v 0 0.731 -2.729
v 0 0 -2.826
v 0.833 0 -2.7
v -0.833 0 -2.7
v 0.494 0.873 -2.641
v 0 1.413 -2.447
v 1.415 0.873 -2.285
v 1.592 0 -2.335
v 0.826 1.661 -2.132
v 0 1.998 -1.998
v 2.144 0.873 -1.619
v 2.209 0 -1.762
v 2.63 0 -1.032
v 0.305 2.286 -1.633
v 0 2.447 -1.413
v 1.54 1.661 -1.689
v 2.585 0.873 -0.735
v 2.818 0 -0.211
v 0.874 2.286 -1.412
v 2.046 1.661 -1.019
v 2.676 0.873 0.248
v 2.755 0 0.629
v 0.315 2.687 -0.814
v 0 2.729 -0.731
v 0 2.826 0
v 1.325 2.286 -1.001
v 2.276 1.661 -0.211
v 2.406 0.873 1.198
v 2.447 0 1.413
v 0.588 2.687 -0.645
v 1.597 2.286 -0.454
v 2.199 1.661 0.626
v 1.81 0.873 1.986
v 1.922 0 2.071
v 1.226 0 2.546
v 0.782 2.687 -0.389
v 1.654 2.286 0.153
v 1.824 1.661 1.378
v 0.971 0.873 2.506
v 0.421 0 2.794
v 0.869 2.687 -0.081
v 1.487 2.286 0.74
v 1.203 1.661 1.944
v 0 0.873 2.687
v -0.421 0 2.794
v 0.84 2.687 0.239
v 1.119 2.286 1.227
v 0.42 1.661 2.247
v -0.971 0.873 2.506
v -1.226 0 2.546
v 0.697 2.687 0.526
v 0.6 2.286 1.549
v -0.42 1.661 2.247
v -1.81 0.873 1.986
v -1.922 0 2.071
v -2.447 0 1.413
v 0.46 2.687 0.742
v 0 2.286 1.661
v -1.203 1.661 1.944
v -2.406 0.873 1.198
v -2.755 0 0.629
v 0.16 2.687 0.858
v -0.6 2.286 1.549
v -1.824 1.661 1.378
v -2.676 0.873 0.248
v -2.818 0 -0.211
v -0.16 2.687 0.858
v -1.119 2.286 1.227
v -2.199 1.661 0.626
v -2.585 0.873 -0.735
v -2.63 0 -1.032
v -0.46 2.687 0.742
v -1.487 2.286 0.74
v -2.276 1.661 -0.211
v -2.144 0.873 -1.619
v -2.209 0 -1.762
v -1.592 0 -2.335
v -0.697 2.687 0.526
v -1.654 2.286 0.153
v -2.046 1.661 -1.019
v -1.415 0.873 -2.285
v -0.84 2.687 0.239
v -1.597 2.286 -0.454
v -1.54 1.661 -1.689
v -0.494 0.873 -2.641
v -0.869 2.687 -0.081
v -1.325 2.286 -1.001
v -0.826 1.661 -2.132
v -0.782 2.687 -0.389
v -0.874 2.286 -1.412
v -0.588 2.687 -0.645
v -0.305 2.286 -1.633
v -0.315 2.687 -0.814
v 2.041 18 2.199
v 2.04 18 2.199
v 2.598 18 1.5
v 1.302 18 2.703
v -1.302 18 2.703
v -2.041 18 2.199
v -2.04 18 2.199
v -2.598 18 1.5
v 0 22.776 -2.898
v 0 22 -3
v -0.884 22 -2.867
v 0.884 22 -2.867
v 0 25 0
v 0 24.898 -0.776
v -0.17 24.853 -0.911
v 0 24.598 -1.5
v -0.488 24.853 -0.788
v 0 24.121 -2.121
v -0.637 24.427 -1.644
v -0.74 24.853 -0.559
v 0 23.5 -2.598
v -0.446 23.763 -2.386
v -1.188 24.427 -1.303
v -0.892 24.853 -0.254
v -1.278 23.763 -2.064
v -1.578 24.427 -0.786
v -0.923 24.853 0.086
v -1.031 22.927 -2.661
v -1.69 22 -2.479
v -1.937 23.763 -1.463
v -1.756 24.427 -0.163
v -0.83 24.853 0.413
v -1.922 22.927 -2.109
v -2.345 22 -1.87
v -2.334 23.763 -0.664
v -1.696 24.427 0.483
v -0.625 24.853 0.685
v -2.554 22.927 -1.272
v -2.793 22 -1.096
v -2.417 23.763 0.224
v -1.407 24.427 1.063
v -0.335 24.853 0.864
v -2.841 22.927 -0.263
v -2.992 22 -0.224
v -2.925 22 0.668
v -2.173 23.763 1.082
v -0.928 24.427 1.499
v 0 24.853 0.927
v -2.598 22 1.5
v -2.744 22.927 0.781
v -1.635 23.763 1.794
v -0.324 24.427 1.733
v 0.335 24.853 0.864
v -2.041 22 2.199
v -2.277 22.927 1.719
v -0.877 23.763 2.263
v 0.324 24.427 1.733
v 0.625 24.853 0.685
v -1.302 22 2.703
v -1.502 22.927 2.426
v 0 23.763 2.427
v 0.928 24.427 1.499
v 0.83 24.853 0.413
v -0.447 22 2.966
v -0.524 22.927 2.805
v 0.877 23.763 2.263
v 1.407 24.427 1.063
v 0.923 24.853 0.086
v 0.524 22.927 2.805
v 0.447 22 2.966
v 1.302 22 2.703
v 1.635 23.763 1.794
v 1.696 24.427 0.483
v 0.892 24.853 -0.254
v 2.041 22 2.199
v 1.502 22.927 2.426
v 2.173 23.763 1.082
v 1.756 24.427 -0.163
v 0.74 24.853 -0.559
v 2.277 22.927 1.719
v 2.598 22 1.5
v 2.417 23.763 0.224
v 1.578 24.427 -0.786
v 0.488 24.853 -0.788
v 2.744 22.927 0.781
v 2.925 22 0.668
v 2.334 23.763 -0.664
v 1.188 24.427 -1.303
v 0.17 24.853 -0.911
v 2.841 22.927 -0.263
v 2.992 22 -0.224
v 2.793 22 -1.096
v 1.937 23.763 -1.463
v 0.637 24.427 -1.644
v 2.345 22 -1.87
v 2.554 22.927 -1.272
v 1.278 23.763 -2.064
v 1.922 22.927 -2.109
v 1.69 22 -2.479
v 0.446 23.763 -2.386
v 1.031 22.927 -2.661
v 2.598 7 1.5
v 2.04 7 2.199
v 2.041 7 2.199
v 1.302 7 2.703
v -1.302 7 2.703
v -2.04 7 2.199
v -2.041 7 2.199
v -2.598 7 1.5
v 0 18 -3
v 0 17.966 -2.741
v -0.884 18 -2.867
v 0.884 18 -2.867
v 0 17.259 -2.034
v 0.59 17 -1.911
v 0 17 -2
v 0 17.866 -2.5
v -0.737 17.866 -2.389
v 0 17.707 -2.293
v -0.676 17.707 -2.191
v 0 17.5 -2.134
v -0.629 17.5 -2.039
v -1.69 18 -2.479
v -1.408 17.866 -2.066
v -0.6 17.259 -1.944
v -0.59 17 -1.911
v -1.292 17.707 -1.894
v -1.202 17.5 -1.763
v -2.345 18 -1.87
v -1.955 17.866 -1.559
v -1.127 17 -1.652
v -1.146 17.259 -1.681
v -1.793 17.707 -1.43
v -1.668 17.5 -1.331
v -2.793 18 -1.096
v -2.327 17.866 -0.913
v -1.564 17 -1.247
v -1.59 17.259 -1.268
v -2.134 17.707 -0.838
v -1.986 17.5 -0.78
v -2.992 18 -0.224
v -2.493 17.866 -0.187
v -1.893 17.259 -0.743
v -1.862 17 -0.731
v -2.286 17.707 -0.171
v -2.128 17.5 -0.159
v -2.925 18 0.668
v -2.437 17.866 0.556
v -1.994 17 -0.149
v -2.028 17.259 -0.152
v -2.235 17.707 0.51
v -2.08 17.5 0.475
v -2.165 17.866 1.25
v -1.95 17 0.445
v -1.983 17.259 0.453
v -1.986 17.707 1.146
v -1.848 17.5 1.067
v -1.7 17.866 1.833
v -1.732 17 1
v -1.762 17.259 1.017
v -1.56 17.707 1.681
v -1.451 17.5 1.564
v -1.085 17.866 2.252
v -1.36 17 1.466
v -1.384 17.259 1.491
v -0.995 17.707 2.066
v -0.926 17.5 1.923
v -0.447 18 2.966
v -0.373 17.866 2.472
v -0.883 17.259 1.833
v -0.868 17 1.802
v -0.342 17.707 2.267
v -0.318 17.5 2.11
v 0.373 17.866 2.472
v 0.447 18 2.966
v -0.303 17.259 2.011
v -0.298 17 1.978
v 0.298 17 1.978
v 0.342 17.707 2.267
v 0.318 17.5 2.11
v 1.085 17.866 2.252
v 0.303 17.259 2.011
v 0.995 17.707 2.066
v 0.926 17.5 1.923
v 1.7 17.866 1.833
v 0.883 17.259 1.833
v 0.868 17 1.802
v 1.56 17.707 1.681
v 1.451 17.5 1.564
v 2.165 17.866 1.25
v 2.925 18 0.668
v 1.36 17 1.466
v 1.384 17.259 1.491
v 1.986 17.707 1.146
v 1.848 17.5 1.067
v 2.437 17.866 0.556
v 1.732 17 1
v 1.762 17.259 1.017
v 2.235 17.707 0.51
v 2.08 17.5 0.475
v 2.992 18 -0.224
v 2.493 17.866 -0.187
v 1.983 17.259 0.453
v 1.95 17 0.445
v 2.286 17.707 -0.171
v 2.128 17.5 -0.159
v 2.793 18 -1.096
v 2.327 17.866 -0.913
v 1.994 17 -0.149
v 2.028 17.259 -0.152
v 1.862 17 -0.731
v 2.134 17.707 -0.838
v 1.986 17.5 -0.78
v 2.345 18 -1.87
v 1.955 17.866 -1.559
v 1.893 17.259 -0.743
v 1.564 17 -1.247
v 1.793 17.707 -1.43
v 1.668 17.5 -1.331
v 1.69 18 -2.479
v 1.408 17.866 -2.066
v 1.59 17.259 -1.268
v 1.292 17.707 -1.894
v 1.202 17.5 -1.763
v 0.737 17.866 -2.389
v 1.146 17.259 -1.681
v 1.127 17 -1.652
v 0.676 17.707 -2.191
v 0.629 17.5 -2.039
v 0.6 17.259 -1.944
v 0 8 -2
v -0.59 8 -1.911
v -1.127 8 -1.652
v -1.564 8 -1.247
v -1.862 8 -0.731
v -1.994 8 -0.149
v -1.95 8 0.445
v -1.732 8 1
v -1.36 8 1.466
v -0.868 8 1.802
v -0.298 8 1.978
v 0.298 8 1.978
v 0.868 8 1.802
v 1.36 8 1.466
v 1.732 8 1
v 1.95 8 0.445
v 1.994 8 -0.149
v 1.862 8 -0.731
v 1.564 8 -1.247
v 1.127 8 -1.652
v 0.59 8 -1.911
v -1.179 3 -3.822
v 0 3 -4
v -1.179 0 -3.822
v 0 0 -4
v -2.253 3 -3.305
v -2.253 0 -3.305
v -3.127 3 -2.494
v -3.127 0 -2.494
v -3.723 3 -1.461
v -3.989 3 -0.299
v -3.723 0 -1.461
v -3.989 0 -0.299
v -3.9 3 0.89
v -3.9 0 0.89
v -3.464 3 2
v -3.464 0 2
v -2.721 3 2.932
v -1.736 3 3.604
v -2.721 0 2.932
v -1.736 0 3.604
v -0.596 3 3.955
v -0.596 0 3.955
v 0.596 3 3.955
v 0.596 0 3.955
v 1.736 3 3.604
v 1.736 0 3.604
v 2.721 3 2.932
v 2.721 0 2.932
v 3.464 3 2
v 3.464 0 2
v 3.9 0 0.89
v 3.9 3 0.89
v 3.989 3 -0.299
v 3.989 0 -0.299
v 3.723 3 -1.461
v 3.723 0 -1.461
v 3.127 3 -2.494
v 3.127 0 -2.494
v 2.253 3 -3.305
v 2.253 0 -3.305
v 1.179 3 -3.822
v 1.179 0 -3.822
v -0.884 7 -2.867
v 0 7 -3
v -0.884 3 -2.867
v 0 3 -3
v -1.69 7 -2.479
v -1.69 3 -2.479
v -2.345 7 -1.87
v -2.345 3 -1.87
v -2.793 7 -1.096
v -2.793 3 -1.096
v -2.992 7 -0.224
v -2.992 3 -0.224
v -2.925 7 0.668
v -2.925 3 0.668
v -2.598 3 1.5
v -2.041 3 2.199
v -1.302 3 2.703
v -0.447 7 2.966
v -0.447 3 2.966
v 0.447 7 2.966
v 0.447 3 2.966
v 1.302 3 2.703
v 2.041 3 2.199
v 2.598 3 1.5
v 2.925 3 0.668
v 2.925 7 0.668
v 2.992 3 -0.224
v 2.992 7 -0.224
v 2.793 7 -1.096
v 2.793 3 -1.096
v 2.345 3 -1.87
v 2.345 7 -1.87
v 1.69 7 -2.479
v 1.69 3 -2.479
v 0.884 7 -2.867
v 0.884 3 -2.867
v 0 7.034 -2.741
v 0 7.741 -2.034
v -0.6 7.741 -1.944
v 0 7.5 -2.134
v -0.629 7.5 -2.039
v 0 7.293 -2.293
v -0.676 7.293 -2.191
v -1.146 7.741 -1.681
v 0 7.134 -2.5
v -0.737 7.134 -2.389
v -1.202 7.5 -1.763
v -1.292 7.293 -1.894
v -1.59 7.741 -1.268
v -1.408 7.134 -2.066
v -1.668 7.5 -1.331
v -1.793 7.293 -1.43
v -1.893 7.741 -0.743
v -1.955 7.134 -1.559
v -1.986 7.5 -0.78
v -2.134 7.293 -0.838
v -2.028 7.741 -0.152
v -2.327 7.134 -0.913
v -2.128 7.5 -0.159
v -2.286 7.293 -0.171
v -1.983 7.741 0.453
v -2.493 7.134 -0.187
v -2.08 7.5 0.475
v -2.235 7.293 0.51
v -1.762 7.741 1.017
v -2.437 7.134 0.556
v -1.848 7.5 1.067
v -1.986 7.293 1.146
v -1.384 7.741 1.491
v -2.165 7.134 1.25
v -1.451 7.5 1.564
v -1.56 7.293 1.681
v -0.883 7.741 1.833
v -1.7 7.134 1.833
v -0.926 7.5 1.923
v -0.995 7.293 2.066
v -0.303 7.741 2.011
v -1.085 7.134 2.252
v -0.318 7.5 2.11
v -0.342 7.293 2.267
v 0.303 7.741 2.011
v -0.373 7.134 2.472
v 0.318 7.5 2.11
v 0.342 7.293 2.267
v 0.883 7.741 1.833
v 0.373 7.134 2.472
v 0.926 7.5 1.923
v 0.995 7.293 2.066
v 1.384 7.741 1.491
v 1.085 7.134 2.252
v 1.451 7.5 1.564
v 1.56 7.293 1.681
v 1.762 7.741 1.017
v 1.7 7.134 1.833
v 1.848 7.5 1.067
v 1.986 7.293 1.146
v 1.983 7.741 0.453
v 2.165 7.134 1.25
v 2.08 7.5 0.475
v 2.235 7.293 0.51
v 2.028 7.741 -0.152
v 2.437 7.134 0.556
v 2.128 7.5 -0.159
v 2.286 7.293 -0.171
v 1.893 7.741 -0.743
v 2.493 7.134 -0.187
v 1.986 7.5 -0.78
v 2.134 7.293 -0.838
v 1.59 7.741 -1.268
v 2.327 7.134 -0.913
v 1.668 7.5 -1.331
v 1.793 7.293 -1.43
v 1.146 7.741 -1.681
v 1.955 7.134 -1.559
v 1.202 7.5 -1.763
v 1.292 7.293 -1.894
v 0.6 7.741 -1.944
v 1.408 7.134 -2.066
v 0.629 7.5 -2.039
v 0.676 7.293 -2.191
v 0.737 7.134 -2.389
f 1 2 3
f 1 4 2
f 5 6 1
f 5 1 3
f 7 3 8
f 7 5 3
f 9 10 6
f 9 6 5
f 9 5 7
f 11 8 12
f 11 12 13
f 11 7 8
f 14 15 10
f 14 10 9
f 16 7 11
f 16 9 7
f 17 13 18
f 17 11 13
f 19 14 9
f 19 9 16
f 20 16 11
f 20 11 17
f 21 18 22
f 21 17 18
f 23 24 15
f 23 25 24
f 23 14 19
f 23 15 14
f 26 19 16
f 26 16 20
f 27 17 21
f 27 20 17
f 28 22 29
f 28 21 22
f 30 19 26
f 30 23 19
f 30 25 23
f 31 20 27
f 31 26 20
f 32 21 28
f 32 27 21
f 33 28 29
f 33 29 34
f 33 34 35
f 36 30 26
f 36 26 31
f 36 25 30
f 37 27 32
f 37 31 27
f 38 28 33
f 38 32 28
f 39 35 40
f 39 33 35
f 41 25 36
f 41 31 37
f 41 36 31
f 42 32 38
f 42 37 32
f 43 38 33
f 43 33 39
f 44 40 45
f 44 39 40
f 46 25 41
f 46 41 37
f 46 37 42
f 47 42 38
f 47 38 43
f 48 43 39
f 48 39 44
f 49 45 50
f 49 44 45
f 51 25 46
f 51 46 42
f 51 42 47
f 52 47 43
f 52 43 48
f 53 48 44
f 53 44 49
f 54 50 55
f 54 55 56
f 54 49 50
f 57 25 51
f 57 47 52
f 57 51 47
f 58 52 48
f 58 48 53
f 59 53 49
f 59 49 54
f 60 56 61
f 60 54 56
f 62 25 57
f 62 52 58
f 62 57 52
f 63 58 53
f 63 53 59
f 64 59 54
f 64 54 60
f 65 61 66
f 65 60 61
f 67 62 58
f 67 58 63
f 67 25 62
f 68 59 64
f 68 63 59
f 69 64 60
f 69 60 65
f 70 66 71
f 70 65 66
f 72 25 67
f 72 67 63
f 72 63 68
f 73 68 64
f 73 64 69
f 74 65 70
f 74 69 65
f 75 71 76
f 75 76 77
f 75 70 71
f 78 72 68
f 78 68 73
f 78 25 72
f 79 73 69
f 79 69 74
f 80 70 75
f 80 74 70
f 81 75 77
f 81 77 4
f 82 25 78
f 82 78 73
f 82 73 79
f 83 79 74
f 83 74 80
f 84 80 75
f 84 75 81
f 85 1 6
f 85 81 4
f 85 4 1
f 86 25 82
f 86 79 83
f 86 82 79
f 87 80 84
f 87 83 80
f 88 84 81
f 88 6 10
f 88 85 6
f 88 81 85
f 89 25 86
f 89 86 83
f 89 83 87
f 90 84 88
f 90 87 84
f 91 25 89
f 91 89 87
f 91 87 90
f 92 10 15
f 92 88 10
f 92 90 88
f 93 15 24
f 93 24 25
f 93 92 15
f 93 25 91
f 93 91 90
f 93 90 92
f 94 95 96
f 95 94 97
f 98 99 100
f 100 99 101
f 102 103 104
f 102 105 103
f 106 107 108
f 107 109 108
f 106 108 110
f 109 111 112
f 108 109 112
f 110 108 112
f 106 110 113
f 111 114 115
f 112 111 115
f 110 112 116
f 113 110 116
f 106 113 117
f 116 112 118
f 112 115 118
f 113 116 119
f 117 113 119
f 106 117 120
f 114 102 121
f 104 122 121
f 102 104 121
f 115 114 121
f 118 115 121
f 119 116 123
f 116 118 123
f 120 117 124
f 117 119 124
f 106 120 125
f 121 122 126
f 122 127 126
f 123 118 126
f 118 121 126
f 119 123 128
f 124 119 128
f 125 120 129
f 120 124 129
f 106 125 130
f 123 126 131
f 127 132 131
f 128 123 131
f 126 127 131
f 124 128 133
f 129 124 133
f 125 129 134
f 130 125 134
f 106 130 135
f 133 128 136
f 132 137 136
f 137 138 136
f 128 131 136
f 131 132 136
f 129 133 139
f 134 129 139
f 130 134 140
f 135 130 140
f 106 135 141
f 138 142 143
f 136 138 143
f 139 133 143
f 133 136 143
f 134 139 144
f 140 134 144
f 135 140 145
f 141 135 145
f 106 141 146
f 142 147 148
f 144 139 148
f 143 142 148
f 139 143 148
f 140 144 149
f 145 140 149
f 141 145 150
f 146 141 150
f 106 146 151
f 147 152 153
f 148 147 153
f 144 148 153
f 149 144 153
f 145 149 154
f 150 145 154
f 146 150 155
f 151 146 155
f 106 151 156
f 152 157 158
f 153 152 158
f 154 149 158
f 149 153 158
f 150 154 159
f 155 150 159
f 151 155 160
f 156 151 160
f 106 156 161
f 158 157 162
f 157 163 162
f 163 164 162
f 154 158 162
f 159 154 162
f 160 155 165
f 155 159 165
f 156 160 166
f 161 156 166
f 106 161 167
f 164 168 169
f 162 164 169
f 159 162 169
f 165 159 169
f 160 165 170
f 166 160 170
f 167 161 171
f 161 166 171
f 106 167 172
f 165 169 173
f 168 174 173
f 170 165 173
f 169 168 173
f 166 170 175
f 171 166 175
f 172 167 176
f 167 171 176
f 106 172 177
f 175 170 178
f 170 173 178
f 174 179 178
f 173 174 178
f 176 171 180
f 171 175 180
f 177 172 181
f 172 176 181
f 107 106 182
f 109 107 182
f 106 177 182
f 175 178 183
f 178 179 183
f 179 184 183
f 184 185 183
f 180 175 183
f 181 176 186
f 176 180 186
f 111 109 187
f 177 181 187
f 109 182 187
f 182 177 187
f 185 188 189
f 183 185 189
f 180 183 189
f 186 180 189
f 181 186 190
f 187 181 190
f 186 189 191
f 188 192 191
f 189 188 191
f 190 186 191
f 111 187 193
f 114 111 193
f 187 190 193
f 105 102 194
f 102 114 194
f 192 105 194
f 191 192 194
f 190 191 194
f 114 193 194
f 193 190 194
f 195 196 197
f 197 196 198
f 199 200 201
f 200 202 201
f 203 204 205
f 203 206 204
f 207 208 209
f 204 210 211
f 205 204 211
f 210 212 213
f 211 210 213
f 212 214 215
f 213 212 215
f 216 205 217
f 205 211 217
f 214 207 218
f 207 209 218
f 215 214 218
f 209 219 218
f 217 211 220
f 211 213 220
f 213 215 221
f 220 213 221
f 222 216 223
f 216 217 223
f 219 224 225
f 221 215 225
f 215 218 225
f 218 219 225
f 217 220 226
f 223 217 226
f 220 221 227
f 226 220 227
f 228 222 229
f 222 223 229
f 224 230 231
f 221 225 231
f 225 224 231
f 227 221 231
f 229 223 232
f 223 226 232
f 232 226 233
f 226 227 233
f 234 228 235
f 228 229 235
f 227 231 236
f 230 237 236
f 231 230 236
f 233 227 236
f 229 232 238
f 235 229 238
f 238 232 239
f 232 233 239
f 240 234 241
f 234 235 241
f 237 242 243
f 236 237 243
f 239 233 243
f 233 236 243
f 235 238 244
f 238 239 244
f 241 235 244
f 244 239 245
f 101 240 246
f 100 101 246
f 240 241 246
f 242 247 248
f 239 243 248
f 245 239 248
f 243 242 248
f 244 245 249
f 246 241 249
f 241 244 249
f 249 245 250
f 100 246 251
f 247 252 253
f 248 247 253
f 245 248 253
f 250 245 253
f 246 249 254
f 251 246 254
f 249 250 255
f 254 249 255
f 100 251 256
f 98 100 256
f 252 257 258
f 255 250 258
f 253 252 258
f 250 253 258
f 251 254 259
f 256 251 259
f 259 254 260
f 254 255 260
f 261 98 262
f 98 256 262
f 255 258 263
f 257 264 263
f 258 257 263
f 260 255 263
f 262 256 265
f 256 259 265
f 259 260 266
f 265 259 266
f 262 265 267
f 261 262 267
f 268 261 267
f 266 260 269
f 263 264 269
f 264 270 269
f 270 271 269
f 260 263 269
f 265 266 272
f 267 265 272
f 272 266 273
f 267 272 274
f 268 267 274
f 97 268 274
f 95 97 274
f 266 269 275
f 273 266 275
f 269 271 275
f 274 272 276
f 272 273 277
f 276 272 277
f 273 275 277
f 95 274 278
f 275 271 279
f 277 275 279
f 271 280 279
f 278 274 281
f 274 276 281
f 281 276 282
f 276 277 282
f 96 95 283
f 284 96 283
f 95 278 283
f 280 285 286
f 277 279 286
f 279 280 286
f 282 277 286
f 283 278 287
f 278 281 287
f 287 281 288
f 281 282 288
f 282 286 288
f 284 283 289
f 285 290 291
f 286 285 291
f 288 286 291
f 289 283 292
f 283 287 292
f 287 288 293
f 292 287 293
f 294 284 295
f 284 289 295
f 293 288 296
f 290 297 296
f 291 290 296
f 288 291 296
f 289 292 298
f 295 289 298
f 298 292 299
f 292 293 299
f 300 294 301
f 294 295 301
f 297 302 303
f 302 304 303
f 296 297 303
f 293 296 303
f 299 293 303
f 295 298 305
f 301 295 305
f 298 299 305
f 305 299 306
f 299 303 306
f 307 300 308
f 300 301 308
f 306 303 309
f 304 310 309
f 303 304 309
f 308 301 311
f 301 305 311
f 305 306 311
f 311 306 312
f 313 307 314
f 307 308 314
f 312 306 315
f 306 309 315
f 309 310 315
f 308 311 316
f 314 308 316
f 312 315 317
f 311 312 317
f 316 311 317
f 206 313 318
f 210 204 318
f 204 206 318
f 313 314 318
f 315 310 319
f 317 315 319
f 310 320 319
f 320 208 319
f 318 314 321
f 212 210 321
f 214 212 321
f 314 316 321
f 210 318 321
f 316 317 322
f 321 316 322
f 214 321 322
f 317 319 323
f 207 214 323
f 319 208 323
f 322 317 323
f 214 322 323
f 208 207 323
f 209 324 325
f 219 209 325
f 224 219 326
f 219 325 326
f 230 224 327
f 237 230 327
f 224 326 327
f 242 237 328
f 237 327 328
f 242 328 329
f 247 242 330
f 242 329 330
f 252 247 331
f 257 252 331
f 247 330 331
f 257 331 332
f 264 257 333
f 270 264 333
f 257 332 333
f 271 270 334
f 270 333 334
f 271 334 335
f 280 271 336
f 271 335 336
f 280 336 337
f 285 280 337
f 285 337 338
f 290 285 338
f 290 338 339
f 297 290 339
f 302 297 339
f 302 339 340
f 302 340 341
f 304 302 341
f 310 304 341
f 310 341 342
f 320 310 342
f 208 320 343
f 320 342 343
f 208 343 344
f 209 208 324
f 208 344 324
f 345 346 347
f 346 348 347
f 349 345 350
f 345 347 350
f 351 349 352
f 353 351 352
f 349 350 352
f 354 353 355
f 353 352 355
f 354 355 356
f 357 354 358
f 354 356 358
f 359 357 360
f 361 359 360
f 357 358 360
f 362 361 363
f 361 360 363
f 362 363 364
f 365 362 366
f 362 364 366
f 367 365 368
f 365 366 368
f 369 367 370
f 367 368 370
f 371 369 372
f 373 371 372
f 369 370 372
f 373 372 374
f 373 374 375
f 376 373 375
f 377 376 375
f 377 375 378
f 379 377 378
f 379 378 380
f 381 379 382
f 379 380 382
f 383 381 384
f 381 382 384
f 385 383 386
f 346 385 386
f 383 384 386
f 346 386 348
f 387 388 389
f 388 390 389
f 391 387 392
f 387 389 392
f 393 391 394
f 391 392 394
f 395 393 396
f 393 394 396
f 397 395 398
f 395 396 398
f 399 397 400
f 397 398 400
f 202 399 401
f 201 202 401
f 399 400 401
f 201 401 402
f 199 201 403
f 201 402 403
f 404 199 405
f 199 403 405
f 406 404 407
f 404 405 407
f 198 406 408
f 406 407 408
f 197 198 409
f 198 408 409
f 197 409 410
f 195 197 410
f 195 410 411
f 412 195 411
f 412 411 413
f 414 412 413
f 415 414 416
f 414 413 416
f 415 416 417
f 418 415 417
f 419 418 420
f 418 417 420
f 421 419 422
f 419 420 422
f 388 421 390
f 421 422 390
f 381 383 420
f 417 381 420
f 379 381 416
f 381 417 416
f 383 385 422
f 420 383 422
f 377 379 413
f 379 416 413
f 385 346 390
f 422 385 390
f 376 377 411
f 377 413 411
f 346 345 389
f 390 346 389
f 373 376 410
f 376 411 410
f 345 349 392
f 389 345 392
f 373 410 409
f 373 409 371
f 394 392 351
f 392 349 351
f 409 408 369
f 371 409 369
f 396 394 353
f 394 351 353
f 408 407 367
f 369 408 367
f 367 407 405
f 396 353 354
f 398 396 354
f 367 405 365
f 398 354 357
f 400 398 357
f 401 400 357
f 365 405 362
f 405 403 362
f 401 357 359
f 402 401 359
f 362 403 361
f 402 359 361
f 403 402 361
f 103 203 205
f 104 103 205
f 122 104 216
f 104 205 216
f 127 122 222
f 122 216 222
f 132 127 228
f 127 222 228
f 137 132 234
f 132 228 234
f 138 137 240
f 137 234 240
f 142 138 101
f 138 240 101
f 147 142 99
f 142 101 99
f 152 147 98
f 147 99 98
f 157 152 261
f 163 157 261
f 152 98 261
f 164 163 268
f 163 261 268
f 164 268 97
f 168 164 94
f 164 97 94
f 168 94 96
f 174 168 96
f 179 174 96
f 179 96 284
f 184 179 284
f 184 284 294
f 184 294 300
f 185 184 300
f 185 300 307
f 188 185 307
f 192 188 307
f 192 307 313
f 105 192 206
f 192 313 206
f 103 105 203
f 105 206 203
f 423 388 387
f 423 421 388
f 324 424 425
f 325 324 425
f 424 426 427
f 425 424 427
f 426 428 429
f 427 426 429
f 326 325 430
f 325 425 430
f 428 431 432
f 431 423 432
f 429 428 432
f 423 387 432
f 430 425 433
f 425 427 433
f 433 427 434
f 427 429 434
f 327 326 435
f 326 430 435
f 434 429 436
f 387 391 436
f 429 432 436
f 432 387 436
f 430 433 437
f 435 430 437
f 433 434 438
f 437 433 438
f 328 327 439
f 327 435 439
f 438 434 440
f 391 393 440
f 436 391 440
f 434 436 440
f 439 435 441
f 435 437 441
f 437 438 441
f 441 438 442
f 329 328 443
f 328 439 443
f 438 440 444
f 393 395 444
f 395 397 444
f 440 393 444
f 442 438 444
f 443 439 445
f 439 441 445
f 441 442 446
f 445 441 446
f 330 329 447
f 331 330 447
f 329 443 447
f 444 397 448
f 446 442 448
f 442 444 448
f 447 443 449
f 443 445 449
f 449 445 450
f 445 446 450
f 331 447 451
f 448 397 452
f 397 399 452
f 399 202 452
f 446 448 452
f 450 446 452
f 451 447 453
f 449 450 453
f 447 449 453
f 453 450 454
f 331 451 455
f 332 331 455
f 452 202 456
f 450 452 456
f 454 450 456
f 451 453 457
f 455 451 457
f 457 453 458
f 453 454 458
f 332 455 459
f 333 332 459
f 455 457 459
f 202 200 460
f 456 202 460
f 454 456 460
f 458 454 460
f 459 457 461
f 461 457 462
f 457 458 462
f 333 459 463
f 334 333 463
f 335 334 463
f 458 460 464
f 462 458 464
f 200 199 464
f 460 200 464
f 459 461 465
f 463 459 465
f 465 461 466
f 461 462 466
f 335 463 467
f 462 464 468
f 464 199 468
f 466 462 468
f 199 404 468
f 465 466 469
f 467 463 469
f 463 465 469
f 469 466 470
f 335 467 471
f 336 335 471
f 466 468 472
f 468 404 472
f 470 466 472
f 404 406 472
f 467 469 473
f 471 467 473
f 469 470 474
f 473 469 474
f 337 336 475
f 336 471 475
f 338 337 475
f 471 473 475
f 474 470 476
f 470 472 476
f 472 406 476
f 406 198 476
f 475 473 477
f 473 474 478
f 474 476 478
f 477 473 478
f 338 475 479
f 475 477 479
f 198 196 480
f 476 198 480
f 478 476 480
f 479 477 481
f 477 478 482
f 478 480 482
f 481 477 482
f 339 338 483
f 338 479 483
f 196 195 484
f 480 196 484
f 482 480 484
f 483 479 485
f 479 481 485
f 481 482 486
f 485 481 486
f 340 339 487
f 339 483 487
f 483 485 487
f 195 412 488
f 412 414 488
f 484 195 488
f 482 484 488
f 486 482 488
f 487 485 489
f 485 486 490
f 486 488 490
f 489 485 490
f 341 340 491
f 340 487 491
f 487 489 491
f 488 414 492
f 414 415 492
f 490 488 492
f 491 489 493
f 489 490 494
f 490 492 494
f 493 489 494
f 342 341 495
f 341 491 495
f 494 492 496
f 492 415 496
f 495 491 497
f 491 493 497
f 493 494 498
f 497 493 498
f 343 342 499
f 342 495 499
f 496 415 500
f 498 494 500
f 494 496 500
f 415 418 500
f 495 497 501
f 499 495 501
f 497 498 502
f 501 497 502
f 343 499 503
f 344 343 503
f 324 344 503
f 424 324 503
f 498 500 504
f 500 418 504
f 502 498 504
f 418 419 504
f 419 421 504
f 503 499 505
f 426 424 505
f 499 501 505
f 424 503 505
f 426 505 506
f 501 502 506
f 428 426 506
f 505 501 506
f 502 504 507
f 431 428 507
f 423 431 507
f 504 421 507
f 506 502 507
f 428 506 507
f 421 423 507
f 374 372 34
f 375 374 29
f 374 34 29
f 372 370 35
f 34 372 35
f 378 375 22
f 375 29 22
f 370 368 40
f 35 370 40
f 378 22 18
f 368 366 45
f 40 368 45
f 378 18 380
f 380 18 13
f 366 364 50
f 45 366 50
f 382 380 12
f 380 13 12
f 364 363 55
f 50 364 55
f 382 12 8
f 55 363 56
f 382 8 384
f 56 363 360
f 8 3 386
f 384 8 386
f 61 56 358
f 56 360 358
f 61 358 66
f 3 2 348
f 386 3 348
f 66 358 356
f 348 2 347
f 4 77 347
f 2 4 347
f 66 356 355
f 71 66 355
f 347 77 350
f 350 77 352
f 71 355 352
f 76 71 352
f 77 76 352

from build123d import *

# Parameters (mm, degrees)
FILLET1_R = 3
FILLET2_R = 1


with BuildPart() as part:
    # Sketch1 → Revolve1 (revolve)
    with BuildSketch(Plane.XY, mode=Mode.PRIVATE) as revolve1_sk:
        Polygon((0, 0), (0, 25), (3, 25), (3, 18), (2, 18), (2, 7), (3, 7), (3, 3), (4, 3), (4, 0), align=None)
    revolve(revolve1_sk.sketch.rotate(Axis((0, 0, 0), (0, 1, 0)), 90), axis=Axis((0, 0, 0), (0, 1, 0)))

    # Fillet1
    fillet1_edges = [part.edges().sort_by_distance(p)[0] for p in [
        (0, 25, 3),
    ]]
    fillet(fillet1_edges, radius=FILLET1_R)

    # Fillet2
    fillet2_edges = [part.edges().sort_by_distance(p)[0] for p in [
        (0, 18, 2),
        (0, 7, 2),
    ]]
    fillet(fillet2_edges, radius=FILLET2_R - 0.0001)  # a hair under: the kernel refuses the full size

    # Sketch2 → Cut-Revolve1 (revolve, cut)
    with BuildSketch(Plane.XY, mode=Mode.PRIVATE) as cut_revolve1_sk:
        with BuildLine():
            Line((0, 2.825522326), (0, 0))
            Line((0, 0), (2.825522326, 0))
            ThreePointArc((2.825522326, 0), (1.997945997, 1.997945997), (0, 2.825522326))
        make_face()
    revolve(cut_revolve1_sk.sketch.rotate(Axis((0, 2.825522326, 0), (0, -1, 0)), 270), axis=Axis((0, 2.825522326, 0), (0, -1, 0)), mode=Mode.SUBTRACT)


solid = part.part
